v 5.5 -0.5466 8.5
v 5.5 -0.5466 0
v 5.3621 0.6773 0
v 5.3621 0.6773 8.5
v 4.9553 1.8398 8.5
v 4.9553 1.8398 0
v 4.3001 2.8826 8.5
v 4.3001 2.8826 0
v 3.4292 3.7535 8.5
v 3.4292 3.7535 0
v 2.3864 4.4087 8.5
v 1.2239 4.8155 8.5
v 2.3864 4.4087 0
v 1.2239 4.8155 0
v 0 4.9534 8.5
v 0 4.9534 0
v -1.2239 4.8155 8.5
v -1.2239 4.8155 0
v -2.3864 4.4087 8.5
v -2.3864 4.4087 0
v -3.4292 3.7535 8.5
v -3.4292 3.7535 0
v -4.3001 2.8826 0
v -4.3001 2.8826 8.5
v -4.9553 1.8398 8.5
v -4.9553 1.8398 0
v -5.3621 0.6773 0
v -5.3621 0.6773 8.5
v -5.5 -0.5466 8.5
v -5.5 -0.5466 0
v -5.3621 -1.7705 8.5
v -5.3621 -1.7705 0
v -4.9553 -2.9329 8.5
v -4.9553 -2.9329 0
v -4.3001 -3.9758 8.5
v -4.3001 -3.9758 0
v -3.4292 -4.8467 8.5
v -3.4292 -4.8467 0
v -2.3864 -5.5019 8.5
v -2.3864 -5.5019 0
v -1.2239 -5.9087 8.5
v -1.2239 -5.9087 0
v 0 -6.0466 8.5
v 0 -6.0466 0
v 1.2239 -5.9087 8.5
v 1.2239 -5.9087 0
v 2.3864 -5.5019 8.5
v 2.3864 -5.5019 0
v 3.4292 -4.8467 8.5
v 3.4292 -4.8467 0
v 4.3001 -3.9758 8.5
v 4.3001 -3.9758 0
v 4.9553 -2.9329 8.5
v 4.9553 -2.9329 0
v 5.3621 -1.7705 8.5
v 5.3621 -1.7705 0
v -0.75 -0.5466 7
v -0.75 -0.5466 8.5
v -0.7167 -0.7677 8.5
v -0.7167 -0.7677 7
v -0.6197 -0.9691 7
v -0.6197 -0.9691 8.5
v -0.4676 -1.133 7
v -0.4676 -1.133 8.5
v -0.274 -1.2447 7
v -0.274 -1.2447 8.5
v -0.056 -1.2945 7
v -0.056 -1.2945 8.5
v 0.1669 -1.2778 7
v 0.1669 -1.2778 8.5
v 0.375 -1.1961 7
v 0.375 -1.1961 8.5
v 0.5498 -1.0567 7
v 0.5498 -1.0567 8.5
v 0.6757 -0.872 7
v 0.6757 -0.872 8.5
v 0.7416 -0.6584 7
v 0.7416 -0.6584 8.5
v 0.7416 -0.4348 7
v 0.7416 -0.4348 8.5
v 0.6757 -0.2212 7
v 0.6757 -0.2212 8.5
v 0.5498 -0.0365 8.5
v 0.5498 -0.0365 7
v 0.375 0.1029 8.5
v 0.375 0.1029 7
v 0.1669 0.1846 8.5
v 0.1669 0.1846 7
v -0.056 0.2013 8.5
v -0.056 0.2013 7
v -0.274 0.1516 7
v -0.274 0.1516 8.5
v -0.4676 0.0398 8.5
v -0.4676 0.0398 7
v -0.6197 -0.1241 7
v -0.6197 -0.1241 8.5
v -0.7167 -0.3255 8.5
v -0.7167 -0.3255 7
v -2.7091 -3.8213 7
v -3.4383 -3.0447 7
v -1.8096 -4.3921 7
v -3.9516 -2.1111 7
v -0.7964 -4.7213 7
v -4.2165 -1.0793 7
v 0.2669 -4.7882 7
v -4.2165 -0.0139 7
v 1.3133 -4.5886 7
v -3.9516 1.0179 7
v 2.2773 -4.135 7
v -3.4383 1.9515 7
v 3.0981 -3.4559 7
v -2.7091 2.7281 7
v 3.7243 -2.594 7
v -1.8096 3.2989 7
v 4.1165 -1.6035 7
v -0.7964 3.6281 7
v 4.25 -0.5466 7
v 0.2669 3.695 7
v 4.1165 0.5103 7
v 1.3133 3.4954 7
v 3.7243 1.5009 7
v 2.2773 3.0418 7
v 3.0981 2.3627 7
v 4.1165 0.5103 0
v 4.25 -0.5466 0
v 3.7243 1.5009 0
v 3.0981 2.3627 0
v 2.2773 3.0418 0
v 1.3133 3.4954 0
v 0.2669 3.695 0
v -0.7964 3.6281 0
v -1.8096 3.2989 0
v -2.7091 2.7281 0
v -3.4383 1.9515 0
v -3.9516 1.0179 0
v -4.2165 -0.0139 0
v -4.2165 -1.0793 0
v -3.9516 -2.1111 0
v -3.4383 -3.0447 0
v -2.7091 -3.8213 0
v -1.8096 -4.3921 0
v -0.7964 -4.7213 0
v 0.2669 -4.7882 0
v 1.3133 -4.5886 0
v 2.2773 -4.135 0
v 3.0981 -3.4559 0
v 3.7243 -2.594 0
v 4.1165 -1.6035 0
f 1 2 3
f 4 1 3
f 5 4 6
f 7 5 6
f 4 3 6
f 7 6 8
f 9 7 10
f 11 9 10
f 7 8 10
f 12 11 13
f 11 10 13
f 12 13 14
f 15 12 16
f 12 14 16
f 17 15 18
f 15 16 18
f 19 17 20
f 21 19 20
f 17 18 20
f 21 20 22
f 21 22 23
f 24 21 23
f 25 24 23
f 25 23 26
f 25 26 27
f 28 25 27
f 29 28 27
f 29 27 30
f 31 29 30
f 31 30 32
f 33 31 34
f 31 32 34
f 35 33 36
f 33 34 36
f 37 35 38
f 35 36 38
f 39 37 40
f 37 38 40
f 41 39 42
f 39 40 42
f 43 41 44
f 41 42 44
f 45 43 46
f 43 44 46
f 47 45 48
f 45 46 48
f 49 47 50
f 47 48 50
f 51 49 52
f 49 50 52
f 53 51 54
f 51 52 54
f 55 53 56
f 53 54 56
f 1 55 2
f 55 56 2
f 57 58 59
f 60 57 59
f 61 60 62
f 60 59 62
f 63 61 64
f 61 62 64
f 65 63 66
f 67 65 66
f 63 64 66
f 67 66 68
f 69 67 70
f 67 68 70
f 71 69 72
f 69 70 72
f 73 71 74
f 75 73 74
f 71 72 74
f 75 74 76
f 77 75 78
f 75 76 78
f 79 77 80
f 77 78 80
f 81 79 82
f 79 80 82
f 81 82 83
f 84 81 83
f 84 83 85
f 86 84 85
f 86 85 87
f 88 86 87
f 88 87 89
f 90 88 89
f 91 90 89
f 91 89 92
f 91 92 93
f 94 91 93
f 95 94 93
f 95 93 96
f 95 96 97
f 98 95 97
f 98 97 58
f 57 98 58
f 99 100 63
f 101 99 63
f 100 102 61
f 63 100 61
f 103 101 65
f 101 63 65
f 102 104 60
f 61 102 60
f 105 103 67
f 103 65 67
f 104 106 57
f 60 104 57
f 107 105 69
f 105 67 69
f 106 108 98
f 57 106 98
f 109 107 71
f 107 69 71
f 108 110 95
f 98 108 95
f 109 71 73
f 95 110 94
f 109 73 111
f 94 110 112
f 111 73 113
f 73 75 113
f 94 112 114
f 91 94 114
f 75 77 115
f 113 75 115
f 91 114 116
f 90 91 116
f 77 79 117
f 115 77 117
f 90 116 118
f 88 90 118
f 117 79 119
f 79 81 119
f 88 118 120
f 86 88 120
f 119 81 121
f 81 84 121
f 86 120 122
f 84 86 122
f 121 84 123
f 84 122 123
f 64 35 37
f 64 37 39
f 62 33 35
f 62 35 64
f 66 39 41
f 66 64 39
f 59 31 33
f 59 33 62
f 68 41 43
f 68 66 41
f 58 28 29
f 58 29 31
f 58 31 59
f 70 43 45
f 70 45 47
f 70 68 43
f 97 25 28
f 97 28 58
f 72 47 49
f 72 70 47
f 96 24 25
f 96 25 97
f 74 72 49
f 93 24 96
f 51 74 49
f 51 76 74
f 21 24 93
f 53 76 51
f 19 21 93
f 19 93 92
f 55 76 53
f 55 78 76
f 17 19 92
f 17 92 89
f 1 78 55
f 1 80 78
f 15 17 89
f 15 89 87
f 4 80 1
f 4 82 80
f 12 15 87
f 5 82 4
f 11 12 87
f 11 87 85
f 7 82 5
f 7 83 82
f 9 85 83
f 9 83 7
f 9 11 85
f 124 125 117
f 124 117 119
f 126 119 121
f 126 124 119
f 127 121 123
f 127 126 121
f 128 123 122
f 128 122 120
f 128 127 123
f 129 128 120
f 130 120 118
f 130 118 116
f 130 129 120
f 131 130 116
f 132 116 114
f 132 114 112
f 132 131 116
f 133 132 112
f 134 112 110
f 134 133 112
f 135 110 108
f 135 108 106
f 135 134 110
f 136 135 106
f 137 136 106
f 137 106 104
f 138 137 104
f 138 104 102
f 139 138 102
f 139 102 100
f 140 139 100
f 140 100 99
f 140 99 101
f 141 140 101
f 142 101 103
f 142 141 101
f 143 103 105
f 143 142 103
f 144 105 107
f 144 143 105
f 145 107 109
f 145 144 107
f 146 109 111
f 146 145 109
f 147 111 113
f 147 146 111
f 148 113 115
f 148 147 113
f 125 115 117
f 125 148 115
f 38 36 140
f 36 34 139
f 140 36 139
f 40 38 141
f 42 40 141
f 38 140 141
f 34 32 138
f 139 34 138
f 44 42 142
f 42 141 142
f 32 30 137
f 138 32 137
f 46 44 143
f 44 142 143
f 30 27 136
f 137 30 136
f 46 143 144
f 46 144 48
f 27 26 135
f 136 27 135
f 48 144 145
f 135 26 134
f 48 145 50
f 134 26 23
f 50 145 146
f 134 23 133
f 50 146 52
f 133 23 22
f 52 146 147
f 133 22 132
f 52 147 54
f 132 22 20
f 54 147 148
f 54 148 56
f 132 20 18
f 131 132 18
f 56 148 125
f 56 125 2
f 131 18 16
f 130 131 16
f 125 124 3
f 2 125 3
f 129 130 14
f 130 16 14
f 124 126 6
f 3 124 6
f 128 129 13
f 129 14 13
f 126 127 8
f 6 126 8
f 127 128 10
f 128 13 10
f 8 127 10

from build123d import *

# Parameters (mm, degrees)
F0_R     = 5.5
F0_R_2   = 4.25
F1_DEPTH = 8.5
F2_DEPTH = 7
F3_D     = 1.5


with BuildPart() as f1:
    # F0 (on Top) → F1 (new body)
    with BuildSketch(Plane.XY):
        with Locations((0, -0.5465864819)):
            Circle(F0_R)
        with Locations((0, -0.5465864819)):
            Circle(F0_R_2, mode=Mode.SUBTRACT)
        with Locations((0, -0.5465864819)):
            Circle(F0_R_2)
    extrude(amount=F1_DEPTH)

    # F0 (on Top) → F2 (cut)
    with BuildSketch(Plane.XY):
        with Locations((0, -0.5465864819)):
            Circle(F0_R_2)
    extrude(amount=F2_DEPTH, mode=Mode.SUBTRACT)

    # F3 (through all)
    with Locations(Plane(origin=(0, 0, 0), x_dir=(1, 0, 0), z_dir=(0, 0, -1))):
        with Locations((0, 0.5465864819)):
            Hole(F3_D / 2)


solid = f1.part
